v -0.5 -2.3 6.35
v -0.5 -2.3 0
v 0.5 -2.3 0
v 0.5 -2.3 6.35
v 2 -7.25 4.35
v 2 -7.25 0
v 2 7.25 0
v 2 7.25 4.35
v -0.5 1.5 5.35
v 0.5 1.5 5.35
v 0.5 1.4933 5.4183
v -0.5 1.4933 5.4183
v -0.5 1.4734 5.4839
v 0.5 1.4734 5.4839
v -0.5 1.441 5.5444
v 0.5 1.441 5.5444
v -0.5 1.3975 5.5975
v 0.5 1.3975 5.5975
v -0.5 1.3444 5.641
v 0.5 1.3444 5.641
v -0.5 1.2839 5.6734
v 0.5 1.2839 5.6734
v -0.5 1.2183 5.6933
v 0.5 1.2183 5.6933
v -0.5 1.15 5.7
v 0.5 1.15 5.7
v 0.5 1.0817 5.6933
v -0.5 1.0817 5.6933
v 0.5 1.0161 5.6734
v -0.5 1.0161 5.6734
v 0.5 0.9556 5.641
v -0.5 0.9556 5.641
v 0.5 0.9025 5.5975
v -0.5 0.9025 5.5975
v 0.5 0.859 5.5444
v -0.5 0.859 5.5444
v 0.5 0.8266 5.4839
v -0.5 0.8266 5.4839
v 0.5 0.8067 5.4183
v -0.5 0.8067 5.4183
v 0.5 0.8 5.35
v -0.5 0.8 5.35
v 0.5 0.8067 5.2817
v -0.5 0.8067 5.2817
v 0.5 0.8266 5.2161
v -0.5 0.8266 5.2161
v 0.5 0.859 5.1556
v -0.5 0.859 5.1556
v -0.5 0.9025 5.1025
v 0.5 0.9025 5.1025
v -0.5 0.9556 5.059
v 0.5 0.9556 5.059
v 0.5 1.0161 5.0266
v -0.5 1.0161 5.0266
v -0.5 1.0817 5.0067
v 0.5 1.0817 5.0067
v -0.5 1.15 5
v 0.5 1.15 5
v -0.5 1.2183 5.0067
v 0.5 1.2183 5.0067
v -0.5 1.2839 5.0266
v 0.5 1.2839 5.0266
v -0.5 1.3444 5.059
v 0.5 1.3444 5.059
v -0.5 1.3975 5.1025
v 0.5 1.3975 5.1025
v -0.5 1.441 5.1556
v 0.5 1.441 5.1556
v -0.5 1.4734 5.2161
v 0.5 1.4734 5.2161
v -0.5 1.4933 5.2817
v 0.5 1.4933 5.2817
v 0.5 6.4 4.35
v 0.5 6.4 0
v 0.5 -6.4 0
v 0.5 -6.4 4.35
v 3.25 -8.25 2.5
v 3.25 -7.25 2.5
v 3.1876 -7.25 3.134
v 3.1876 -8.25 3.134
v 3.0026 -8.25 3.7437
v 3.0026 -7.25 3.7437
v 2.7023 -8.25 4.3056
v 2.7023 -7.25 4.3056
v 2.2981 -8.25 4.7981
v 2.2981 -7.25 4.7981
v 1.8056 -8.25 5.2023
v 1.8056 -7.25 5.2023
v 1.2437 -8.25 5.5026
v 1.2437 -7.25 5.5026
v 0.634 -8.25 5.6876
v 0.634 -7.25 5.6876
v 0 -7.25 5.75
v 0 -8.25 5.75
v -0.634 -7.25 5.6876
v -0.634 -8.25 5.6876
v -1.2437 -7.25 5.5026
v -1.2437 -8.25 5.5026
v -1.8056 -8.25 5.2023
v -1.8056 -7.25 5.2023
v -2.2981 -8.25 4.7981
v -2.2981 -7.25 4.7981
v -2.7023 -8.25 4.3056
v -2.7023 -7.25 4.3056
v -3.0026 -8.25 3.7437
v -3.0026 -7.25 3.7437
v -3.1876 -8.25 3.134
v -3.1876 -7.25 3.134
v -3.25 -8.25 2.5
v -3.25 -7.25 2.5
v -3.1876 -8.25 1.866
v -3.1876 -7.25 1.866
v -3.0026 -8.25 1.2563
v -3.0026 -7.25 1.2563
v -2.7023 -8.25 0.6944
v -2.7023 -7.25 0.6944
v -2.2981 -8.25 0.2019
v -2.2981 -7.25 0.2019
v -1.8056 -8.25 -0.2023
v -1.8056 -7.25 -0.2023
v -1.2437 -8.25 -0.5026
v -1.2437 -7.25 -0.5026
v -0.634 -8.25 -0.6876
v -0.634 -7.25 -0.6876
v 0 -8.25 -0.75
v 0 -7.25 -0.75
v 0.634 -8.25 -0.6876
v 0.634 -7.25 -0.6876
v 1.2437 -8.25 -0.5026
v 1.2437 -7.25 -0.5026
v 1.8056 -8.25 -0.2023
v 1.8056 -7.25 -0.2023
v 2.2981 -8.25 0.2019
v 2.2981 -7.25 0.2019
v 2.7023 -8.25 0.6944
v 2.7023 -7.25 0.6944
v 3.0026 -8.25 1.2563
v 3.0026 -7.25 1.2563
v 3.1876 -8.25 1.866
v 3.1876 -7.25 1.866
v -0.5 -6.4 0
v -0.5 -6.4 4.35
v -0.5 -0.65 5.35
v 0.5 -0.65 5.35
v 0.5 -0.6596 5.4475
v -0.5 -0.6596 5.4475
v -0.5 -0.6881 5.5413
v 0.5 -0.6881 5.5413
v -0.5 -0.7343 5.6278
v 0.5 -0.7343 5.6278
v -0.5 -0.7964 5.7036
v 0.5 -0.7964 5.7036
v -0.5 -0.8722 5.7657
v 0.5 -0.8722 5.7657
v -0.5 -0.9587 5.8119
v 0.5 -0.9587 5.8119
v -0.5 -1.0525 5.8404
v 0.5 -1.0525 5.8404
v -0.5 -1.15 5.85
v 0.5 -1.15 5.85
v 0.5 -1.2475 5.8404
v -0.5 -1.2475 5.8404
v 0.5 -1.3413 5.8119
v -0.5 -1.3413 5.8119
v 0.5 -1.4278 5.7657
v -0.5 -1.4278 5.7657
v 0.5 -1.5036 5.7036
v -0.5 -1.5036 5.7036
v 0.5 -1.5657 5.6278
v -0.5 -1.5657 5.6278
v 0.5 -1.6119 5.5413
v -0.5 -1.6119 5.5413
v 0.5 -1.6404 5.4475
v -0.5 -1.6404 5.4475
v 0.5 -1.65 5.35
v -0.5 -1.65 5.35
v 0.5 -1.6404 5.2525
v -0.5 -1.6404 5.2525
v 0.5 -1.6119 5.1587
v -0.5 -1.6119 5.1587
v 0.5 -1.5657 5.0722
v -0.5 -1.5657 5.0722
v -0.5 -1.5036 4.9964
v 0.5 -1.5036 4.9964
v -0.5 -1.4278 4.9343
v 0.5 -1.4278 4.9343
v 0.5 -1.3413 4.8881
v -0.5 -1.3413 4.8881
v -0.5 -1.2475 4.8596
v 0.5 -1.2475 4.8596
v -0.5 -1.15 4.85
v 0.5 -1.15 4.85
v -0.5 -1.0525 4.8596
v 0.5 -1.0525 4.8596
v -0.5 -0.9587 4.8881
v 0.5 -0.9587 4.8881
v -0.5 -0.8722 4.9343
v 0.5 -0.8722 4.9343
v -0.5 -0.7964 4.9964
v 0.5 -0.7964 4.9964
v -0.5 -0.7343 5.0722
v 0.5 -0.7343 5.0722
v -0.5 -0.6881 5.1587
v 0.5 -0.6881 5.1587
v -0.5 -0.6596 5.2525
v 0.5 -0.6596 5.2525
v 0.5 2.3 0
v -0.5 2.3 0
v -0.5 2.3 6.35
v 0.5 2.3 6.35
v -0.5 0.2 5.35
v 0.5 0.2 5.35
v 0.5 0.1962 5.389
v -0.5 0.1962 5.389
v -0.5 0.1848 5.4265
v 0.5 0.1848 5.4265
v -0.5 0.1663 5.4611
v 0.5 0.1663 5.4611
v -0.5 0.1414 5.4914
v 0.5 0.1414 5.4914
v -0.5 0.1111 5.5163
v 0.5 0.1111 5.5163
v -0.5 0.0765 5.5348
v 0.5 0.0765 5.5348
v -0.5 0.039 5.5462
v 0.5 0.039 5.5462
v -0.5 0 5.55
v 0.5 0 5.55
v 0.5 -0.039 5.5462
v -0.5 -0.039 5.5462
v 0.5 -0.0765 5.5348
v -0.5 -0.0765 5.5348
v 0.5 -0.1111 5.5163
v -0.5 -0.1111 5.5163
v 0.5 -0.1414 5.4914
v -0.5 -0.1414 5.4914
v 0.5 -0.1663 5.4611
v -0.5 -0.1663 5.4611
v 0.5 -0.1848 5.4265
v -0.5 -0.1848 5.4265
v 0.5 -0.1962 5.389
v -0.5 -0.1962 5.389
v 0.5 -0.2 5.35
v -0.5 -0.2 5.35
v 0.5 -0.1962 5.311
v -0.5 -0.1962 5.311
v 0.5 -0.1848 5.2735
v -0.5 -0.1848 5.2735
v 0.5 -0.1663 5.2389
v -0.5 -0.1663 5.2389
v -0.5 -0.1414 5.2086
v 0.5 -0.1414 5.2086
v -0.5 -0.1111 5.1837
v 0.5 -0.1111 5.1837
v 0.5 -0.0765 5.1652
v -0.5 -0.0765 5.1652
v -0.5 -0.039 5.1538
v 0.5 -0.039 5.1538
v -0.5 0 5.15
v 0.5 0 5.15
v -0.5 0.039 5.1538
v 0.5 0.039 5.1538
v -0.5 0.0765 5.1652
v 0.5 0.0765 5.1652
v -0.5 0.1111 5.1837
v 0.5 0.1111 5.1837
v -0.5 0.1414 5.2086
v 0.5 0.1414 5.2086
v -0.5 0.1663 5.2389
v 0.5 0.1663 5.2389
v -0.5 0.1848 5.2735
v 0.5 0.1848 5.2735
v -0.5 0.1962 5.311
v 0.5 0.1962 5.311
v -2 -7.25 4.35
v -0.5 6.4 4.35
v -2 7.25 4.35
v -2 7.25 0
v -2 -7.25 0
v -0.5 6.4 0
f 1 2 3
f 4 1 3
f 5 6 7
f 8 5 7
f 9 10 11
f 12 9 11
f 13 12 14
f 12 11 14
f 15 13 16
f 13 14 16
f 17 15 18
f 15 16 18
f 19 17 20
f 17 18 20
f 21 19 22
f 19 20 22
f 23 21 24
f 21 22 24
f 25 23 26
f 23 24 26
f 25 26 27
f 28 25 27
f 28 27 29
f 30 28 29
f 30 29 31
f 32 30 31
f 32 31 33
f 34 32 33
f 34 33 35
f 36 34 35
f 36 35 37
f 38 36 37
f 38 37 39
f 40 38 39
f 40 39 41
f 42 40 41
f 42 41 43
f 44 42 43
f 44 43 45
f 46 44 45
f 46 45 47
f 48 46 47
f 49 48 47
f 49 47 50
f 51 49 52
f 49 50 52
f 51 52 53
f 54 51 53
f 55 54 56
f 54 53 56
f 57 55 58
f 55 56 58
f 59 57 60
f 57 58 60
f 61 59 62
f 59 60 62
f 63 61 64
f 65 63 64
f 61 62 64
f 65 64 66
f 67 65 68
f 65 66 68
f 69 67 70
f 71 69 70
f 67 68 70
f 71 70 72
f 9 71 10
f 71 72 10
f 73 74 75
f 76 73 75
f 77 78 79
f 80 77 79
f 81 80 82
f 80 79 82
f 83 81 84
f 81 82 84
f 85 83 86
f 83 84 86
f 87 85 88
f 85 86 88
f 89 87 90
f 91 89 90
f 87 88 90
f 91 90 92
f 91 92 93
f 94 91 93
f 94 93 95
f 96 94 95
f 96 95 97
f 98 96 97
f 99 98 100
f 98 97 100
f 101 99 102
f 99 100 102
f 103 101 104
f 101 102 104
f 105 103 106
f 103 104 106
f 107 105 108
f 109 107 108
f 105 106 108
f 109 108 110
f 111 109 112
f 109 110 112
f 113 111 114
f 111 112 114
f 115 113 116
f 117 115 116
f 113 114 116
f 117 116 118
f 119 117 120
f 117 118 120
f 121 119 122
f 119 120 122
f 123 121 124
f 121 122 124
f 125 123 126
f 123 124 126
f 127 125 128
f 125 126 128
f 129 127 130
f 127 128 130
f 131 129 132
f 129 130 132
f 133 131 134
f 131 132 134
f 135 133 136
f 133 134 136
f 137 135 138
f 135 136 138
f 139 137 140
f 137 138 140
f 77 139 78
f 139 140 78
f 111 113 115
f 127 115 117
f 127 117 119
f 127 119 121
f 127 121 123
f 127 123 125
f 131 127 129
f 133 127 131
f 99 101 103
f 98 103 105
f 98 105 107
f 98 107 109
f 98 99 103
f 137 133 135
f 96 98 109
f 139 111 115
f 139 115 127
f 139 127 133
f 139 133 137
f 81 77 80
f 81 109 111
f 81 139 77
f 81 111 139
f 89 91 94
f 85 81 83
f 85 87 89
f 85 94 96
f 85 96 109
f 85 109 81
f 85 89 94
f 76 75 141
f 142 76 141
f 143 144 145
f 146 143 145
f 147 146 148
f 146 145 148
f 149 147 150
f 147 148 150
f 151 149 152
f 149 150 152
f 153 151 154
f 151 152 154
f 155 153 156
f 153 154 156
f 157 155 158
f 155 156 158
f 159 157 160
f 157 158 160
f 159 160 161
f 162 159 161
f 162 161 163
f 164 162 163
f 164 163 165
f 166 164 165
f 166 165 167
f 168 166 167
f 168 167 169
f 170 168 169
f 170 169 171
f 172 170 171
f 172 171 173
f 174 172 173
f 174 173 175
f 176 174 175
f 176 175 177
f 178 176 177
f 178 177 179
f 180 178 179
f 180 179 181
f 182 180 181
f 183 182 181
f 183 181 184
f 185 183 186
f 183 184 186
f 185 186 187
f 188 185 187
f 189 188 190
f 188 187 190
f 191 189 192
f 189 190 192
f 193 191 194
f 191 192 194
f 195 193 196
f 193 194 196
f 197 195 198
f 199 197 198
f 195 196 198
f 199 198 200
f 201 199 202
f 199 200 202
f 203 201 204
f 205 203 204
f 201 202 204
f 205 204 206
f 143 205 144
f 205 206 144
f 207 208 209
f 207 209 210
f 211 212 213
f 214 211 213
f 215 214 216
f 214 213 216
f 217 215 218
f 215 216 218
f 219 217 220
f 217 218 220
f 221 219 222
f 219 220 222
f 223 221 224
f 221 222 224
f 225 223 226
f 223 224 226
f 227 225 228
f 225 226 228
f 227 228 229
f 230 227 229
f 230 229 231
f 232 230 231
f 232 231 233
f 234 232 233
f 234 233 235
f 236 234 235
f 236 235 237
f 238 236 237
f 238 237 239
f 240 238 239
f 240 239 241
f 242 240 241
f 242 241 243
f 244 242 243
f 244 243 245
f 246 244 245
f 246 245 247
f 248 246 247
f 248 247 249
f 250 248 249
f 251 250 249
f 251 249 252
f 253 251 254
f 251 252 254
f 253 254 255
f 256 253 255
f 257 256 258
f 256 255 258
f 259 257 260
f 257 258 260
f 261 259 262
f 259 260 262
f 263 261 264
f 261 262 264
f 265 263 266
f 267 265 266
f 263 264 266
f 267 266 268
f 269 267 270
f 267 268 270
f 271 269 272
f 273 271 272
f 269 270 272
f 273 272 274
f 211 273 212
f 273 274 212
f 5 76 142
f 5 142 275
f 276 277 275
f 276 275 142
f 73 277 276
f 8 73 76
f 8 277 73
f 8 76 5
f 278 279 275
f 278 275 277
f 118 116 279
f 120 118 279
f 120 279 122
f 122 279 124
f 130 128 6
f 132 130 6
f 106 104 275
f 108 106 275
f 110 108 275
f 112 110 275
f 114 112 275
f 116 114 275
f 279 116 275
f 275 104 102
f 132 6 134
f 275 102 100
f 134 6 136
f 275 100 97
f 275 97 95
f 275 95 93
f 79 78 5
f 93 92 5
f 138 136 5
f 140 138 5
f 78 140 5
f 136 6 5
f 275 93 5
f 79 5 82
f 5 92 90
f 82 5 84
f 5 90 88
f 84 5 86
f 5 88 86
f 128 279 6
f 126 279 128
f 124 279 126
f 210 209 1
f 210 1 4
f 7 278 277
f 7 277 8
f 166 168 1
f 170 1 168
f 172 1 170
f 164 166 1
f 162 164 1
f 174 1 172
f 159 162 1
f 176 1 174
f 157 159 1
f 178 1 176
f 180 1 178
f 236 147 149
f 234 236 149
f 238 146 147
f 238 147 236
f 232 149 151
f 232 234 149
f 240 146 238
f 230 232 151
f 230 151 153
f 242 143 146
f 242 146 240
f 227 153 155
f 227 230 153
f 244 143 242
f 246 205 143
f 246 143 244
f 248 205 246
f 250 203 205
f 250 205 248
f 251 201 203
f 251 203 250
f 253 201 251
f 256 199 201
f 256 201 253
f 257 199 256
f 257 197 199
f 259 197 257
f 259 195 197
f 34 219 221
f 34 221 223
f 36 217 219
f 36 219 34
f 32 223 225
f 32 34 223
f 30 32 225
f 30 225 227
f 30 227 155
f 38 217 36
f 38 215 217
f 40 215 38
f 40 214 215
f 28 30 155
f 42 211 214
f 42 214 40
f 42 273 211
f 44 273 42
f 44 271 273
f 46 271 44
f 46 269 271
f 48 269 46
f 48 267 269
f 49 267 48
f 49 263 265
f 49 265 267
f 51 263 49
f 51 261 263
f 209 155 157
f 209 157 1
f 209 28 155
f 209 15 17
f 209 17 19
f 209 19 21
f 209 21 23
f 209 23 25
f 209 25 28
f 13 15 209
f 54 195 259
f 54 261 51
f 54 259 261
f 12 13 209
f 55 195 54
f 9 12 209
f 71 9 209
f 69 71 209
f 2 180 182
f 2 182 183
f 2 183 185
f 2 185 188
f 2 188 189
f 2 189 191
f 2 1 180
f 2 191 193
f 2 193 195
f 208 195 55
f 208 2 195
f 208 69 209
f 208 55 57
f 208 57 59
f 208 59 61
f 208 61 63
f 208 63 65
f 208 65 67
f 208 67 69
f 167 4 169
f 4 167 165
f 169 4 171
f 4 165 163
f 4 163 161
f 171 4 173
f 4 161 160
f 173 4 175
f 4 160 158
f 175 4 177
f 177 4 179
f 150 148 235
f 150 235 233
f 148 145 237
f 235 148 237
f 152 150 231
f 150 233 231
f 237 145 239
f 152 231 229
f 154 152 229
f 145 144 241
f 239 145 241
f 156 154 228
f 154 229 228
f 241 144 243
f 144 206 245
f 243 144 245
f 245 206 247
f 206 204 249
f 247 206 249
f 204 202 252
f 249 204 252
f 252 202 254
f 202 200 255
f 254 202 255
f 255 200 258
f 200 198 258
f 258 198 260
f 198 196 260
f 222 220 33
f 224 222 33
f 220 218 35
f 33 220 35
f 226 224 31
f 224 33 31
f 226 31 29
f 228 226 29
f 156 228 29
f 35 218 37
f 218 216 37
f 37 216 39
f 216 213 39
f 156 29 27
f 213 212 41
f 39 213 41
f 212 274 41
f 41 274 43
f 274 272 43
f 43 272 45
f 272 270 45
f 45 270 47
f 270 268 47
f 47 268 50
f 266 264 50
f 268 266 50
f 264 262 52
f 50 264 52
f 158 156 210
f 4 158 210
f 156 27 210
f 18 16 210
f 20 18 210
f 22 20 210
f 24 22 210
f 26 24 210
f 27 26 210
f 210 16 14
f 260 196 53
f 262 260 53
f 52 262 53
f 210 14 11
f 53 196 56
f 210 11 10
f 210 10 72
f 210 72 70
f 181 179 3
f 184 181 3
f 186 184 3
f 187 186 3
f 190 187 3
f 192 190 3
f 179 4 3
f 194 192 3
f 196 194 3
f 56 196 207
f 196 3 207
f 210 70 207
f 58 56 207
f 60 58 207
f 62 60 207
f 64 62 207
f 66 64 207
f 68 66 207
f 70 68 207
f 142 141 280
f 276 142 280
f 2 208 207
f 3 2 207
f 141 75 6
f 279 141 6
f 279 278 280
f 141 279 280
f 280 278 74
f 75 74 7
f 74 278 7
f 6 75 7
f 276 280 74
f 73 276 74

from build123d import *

# Parameters (mm, degrees)
F0_W     = 4
F0_H     = 14.5
F1_DEPTH = 4.35
F0_W_2   = 1
F0_H_2   = 4.6
F2_DEPTH = 6.35
F4_R     = 3.25
F4_W     = 4
F4_H     = 4.35
F5_DEPTH = 1
F3_R     = 0.5
F3_R_2   = 0.2
F3_R_3   = 0.35
F6_DEPTH = 3.751


with BuildPart() as f1:
    # F0 (on Top) → F1 (new body)
    with BuildSketch(Plane.XY):
        Rectangle(F0_W, F0_H)
        Polygon((-0.5, 6.4), (0.5, 6.4), (0.5, 2.3), (0.5, -2.3), (0.5, -6.4), (-0.5, -6.4), (-0.5, -2.3), (-0.5, 2.3), align=None, mode=Mode.SUBTRACT)
    extrude(amount=F1_DEPTH)

    # F4 (on face) → F5 (join)
    with BuildSketch(Plane.XZ.offset(7.25)):
        with Locations((0, 2.5)):
            Circle(F4_R)
        with Locations((0, 2.175)):
            Rectangle(F4_W, F4_H, mode=Mode.SUBTRACT)
        with Locations((0, 2.175)):
            Rectangle(F4_W, F4_H)
    extrude(amount=F5_DEPTH)


with BuildPart() as f2:
    # F0 (on Top) → F2 (new body)
    with BuildSketch(Plane.XY):
        Rectangle(F0_W_2, F0_H_2)
    extrude(amount=F2_DEPTH)

    # F3 (on face) → F6 (cut, through all)
    with BuildSketch(Plane.YZ.offset(0.5)):
        with Locations((-1.15, 5.35)):
            Circle(F3_R)
        with Locations((0, 5.35)):
            Circle(F3_R_2)
        with Locations((1.15, 5.35)):
            Circle(F3_R_3)
    extrude(amount=-F6_DEPTH, mode=Mode.SUBTRACT)


solid = Compound([f1.part, f2.part])
